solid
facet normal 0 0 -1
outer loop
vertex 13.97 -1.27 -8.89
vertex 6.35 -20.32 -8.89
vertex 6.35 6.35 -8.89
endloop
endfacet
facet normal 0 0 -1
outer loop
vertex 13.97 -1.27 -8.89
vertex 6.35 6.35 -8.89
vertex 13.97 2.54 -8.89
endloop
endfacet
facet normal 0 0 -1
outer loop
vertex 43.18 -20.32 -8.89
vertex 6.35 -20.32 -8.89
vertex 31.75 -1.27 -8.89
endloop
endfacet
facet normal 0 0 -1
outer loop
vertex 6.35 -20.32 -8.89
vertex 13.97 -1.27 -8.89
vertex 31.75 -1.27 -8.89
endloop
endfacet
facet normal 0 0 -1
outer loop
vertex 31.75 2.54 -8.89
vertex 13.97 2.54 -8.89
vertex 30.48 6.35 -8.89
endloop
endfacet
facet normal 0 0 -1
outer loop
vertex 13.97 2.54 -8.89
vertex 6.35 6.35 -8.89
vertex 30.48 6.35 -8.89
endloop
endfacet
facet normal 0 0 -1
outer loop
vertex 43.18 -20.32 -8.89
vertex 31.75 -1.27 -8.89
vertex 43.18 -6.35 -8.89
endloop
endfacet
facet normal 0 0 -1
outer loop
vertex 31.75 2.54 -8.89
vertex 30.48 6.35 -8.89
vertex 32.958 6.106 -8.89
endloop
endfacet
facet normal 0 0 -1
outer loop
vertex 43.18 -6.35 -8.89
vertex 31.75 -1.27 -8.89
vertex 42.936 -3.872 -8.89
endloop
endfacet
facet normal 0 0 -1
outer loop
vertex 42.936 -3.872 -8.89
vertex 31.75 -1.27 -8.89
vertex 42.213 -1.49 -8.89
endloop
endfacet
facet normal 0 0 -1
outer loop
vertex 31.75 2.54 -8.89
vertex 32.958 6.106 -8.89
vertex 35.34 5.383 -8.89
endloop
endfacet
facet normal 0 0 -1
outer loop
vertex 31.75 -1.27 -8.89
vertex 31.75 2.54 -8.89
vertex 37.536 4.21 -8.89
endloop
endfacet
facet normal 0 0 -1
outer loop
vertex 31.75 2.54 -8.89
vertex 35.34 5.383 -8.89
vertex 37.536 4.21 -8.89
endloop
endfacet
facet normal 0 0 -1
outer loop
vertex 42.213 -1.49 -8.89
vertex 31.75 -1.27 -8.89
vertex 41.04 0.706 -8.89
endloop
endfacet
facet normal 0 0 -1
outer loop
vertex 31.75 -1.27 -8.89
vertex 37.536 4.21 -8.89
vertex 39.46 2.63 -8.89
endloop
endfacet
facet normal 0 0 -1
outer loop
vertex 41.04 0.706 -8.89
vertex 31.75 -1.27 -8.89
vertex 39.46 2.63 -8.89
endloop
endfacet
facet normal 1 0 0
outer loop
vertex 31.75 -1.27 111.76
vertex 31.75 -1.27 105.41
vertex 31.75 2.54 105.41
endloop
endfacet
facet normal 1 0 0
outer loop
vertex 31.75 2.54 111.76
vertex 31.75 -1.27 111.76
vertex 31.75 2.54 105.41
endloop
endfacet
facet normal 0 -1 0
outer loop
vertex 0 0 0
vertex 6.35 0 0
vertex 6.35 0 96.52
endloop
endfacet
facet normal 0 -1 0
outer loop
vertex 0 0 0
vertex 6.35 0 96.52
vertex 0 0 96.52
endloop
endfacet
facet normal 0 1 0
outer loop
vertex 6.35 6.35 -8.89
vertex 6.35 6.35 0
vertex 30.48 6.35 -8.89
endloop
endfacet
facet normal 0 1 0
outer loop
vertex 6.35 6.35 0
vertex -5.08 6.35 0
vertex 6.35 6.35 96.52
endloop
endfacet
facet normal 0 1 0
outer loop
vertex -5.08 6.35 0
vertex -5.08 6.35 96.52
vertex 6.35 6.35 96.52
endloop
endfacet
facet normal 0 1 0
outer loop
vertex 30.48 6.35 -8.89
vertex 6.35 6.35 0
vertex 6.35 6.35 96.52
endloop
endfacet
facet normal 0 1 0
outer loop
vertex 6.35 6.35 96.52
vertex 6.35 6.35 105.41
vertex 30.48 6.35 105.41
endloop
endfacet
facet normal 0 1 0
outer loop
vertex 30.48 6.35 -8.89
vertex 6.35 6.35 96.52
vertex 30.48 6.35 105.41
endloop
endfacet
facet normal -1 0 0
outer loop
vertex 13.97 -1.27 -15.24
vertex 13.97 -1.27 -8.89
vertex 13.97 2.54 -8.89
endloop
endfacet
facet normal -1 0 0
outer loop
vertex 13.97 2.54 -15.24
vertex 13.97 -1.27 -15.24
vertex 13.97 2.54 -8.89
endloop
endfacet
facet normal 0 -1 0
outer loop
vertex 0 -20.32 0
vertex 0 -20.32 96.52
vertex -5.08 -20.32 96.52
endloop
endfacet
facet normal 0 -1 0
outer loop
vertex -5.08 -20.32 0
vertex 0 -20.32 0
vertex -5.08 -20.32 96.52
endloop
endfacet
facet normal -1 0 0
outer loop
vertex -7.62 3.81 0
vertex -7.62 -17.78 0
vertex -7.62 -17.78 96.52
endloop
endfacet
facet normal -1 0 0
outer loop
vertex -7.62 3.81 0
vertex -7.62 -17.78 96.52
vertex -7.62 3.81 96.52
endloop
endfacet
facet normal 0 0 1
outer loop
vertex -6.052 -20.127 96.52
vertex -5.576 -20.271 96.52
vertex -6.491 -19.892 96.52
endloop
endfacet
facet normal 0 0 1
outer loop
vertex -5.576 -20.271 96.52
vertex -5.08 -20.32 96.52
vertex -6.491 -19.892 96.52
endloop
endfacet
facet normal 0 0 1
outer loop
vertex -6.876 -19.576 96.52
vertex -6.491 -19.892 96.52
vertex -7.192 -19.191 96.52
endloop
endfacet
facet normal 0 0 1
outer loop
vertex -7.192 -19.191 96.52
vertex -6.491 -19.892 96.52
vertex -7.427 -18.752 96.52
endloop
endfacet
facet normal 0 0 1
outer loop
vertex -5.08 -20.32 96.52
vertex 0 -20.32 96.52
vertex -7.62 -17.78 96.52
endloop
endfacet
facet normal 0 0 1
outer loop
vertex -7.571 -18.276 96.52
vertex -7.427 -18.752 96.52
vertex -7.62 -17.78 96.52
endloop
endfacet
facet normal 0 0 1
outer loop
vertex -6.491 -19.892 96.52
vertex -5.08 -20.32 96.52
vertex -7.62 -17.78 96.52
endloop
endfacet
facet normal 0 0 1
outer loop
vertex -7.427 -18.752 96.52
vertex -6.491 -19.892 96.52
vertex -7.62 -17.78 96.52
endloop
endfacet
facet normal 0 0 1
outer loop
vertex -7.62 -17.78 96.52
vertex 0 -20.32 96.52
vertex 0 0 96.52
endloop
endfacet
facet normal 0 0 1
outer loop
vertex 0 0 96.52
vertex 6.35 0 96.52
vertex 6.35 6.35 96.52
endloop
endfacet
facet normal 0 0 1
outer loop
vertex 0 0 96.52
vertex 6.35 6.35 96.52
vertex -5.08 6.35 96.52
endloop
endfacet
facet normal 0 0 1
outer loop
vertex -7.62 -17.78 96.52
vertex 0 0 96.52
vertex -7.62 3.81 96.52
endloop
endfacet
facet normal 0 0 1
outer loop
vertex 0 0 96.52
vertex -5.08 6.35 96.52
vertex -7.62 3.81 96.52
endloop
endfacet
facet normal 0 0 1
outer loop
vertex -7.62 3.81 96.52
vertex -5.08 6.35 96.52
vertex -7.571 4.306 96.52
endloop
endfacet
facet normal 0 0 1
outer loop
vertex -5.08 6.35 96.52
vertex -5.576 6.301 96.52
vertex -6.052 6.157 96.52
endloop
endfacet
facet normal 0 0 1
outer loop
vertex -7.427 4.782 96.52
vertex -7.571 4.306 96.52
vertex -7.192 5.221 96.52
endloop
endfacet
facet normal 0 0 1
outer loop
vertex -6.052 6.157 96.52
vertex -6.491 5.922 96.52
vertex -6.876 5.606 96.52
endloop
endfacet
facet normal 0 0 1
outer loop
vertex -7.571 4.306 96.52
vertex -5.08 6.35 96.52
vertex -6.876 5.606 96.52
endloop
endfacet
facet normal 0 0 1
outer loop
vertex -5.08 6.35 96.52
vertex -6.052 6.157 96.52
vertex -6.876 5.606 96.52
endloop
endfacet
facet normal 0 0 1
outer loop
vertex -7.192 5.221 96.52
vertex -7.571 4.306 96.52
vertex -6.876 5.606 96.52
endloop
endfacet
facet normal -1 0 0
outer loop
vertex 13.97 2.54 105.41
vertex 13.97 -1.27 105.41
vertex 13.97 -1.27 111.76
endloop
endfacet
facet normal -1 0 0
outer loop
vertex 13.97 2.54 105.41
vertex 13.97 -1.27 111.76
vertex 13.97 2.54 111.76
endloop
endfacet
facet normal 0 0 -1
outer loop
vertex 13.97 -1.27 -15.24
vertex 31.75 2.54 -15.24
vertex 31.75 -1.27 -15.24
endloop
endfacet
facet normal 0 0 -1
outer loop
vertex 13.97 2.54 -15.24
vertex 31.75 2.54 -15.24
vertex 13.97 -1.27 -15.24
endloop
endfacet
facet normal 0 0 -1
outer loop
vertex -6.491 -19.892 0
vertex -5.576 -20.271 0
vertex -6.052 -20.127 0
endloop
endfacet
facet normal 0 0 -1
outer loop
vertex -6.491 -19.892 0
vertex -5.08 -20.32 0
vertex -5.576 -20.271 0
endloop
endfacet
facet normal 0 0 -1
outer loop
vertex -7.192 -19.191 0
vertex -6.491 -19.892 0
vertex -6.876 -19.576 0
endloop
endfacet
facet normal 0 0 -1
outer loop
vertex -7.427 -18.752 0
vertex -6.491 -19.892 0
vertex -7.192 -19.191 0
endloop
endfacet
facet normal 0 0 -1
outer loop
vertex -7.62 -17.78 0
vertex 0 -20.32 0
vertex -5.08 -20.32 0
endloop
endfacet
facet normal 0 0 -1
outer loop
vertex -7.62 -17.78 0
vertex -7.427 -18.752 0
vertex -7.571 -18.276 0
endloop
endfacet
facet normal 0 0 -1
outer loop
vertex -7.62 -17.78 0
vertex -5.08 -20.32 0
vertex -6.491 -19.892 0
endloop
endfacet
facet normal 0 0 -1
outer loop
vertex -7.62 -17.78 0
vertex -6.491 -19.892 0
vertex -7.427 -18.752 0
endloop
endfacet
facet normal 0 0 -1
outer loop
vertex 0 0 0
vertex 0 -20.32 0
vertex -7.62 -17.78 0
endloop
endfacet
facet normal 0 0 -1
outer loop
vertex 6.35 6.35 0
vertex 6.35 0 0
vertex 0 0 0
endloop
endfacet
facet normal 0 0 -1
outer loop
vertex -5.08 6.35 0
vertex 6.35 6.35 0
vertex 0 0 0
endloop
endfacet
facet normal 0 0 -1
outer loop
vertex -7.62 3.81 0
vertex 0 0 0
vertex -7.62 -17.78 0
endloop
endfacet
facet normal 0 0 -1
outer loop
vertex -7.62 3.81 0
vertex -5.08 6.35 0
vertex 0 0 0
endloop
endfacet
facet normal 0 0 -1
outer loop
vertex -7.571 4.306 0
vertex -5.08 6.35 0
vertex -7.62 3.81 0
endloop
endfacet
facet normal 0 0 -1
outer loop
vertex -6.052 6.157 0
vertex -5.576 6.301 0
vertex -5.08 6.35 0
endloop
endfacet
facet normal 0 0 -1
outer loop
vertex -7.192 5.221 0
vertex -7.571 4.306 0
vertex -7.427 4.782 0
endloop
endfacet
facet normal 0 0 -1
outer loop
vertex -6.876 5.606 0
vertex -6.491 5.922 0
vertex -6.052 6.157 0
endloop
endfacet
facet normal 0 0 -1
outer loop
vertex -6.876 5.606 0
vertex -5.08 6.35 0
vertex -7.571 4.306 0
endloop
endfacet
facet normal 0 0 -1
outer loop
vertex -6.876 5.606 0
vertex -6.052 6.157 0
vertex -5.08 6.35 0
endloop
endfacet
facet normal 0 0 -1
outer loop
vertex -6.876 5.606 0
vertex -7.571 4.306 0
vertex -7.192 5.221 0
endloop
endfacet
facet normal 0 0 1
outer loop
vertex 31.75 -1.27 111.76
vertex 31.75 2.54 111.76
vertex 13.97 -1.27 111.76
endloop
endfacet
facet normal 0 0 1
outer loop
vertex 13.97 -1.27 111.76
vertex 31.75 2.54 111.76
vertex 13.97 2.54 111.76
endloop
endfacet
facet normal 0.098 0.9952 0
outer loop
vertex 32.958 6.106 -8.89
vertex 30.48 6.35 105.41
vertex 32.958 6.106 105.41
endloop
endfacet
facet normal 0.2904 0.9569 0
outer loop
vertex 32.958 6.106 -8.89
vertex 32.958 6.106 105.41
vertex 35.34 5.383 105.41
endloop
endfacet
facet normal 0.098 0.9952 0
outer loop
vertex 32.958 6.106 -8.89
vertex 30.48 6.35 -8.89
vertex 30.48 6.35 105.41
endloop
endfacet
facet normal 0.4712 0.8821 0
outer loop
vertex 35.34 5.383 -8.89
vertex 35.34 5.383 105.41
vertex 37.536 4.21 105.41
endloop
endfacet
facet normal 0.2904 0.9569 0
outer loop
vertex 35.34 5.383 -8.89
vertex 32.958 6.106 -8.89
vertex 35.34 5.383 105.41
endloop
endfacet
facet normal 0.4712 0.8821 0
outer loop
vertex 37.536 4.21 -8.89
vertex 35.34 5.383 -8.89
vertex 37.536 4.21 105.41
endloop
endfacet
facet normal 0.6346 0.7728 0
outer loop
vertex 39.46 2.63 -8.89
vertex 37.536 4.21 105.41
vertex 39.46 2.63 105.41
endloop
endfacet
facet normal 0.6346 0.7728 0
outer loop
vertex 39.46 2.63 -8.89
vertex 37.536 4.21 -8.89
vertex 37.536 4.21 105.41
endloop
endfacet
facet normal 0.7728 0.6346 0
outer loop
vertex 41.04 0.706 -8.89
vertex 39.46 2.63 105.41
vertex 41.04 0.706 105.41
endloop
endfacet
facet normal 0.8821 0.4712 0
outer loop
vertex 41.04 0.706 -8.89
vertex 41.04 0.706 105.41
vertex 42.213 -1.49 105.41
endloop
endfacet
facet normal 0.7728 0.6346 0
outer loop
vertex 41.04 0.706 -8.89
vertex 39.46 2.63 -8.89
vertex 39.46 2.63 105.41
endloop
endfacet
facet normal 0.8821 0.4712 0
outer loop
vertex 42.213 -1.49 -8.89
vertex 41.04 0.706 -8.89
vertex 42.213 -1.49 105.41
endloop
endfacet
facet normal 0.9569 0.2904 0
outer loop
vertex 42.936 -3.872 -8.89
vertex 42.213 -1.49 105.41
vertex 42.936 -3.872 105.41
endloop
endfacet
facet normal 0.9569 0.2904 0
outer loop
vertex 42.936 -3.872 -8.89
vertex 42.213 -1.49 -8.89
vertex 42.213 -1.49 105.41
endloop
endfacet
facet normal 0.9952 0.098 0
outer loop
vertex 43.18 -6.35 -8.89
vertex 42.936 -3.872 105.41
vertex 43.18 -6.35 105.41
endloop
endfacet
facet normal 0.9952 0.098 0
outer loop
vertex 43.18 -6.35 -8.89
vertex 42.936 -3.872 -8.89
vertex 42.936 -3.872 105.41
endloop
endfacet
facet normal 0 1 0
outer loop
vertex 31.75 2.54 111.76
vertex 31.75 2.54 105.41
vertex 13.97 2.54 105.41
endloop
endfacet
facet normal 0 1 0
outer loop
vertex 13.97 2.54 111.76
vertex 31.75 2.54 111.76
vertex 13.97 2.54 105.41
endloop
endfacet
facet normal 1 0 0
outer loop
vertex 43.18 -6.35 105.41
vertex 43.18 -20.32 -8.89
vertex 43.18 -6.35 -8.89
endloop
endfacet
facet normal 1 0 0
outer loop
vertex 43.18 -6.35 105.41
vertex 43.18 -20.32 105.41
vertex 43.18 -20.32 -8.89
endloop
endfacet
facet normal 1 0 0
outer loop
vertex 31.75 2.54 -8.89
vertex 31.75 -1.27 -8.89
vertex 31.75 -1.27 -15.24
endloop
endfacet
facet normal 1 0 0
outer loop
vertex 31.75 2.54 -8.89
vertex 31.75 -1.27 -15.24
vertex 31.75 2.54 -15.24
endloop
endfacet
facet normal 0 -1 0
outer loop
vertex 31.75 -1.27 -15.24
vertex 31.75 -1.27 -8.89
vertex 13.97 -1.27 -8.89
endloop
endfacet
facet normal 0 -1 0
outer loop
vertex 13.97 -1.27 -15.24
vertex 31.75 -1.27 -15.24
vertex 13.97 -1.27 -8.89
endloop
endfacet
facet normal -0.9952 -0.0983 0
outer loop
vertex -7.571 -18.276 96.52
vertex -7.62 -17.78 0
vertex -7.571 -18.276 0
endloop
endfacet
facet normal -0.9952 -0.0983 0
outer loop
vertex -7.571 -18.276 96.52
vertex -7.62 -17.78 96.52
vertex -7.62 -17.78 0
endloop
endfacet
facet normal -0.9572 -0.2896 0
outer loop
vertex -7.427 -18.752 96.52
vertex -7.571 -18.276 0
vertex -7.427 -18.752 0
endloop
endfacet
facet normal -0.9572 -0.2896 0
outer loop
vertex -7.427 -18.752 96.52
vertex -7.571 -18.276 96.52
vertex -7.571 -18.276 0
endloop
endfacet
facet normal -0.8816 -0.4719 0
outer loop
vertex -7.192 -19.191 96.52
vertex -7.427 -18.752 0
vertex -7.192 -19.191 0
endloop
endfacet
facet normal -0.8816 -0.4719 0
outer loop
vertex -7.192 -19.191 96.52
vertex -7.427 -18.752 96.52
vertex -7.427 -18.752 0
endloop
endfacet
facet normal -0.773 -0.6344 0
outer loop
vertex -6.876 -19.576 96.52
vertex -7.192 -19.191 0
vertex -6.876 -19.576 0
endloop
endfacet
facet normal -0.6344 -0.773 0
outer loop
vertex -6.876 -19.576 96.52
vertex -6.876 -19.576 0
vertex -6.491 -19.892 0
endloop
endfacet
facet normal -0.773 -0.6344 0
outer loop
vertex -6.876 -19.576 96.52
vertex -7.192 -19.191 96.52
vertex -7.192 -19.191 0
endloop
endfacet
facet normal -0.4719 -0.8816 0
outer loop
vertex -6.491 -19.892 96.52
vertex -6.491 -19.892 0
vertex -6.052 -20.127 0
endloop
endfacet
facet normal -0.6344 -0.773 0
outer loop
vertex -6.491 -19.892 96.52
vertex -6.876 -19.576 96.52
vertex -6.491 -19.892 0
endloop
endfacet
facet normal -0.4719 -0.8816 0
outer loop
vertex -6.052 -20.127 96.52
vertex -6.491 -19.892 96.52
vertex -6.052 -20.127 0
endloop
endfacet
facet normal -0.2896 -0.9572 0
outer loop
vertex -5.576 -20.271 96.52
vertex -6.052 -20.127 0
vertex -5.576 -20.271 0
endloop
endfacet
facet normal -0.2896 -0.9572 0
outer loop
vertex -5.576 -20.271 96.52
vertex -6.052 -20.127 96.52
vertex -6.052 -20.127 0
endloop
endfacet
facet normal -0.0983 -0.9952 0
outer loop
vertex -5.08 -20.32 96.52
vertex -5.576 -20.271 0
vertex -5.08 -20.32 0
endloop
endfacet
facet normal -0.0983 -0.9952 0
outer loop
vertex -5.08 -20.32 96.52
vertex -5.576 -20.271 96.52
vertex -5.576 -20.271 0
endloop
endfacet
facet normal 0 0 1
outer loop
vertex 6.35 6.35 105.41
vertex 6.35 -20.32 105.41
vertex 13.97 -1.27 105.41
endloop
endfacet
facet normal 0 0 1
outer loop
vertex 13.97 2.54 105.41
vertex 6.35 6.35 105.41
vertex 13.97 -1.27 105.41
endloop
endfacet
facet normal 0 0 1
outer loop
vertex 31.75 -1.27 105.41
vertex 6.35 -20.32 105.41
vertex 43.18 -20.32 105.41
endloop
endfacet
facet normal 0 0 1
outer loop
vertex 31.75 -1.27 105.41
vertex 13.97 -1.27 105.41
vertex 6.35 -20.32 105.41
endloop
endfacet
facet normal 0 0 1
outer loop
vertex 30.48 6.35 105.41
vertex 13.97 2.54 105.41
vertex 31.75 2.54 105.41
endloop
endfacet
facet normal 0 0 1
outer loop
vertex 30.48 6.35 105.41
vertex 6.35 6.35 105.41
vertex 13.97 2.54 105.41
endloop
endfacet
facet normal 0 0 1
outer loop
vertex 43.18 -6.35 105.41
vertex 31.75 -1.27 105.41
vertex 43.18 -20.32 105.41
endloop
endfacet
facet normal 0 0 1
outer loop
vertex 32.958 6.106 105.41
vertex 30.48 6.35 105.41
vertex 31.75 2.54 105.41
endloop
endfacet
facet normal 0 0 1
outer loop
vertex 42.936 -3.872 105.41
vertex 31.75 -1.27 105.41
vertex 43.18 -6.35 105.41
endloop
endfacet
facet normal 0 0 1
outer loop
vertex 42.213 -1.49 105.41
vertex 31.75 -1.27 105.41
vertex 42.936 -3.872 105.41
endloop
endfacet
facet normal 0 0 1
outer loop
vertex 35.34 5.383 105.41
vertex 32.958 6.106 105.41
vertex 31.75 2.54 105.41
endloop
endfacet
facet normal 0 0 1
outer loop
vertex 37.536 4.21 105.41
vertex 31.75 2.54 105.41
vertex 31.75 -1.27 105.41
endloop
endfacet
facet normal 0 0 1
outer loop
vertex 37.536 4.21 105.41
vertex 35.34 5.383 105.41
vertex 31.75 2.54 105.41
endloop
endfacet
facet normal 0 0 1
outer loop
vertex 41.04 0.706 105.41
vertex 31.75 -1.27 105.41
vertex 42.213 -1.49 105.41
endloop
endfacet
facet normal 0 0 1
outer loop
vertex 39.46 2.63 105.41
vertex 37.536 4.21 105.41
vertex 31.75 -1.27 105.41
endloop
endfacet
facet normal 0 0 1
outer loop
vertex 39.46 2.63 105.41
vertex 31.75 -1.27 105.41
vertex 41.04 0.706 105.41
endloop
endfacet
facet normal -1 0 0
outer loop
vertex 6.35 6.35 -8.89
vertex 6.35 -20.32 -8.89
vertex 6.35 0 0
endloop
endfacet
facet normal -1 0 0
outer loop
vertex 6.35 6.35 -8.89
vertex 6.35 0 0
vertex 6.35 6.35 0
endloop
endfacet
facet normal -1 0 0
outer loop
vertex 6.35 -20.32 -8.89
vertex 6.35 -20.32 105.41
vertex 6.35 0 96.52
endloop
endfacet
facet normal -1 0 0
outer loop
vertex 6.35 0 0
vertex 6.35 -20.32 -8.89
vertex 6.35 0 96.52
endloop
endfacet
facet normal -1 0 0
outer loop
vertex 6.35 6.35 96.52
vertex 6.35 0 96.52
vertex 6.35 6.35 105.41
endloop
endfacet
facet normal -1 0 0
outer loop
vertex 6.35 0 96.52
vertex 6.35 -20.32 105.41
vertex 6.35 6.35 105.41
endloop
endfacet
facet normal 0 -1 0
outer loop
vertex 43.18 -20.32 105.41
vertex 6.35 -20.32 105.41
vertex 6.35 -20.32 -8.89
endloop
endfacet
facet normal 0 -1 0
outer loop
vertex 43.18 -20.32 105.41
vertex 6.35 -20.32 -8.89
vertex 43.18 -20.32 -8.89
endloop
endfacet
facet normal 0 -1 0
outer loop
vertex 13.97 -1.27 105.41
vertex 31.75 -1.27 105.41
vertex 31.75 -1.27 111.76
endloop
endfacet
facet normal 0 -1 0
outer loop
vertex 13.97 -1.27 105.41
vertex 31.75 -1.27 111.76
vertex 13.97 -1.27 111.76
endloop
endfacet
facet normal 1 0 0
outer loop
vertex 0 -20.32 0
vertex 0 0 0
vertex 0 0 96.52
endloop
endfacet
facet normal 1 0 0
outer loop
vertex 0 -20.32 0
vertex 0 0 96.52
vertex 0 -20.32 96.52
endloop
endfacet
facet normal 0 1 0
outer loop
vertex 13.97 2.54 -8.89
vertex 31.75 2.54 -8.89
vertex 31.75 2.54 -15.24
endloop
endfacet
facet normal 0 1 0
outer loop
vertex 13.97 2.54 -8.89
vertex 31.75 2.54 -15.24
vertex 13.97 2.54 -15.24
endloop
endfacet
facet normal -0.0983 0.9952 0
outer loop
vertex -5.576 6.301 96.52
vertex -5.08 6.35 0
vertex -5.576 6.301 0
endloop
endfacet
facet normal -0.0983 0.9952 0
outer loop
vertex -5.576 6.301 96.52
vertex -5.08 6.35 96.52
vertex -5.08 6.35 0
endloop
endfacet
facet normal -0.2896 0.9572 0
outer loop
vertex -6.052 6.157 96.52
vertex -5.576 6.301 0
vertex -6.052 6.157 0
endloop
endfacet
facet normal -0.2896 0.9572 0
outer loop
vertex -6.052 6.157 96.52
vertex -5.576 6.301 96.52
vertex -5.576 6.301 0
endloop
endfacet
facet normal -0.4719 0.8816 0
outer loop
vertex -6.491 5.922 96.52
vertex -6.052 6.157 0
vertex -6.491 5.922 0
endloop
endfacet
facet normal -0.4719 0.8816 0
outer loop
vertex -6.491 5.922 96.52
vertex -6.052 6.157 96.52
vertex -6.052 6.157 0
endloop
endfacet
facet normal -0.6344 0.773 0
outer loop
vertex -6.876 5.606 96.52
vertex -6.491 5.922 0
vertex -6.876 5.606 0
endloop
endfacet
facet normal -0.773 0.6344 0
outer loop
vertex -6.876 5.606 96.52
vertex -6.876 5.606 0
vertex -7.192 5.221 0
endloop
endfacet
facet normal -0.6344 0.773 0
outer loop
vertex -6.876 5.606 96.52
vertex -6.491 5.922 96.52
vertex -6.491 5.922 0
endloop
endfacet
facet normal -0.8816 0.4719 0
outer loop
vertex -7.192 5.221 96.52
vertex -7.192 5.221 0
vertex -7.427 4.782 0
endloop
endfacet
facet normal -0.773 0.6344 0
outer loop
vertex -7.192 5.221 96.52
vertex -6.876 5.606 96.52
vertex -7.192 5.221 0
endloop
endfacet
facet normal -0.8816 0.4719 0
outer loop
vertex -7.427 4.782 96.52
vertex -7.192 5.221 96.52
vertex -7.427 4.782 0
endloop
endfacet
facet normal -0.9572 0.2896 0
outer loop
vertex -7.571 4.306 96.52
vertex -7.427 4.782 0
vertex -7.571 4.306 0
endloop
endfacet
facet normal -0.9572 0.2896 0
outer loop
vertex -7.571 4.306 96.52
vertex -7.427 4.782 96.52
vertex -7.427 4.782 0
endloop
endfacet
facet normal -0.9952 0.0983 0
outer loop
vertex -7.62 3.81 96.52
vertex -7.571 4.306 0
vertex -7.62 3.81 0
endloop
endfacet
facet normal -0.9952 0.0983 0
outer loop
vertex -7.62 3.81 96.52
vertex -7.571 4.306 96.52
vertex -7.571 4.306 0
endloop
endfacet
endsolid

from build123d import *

# Parameters (mm, degrees)
BOSS_EXTRUDE1_DEPTH = 96.52
SKETCH3_W           = 36.83
SKETCH3_H           = 26.67
BOSS_EXTRUDE3_DEPTH = 8.89
SKETCH2_W           = 17.78
SKETCH2_H           = 3.81
BOSS_EXTRUDE4_DEPTH = 6.35
FILLET1_R           = 12.7
FILLET2_R           = 2.54


with BuildPart() as part:
    # Sketch1 → Boss-Extrude1 (new body)
    with BuildSketch(Plane.XY):
        Polygon((0, 0), (0, -20.32), (-7.62, -20.32), (-7.62, 6.35), (43.18, 6.35), (43.18, -20.32), (6.35, -20.32), (6.35, 0), align=None)
    extrude(amount=BOSS_EXTRUDE1_DEPTH)

    # Sketch3 → Boss-Extrude3 (add)
    with BuildSketch(Plane.XY.offset(96.52)):
        with Locations((24.765, -6.985)):
            Rectangle(SKETCH3_W, SKETCH3_H)
    boss_extrude3 = extrude(amount=BOSS_EXTRUDE3_DEPTH)

    # Sketch2 → Boss-Extrude4 (add)
    with BuildSketch(Plane(origin=(0, 0, 105.41), x_dir=(-1, 0, 0), z_dir=(0, 0, -1))):
        with Locations((-22.86, 0.635)):
            Rectangle(SKETCH2_W, SKETCH2_H)
    boss_extrude4 = extrude(amount=-BOSS_EXTRUDE4_DEPTH)

    # Mirror2: Boss-Extrude3, Boss-Extrude4 across plane
    add(boss_extrude3.mirror(Plane(origin=(0, 0, 48.26), x_dir=(1, 0, 0), z_dir=(0, 0, -1))))
    add(boss_extrude4.mirror(Plane(origin=(0, 0, 48.26), x_dir=(1, 0, 0), z_dir=(0, 0, -1))))

    # Fillet1
    fillet1_edges = [part.edges().sort_by_distance(p)[0] for p in [
        (43.18, 6.35, 48.26),
    ]]
    fillet(fillet1_edges, radius=FILLET1_R)

    # Fillet2
    fillet2_edges = [part.edges().sort_by_distance(p)[0] for p in [
        (-7.62, -20.32, 48.26),
        (-7.62, 6.35, 48.26),
    ]]
    fillet(fillet2_edges, radius=FILLET2_R)


solid = part.part
